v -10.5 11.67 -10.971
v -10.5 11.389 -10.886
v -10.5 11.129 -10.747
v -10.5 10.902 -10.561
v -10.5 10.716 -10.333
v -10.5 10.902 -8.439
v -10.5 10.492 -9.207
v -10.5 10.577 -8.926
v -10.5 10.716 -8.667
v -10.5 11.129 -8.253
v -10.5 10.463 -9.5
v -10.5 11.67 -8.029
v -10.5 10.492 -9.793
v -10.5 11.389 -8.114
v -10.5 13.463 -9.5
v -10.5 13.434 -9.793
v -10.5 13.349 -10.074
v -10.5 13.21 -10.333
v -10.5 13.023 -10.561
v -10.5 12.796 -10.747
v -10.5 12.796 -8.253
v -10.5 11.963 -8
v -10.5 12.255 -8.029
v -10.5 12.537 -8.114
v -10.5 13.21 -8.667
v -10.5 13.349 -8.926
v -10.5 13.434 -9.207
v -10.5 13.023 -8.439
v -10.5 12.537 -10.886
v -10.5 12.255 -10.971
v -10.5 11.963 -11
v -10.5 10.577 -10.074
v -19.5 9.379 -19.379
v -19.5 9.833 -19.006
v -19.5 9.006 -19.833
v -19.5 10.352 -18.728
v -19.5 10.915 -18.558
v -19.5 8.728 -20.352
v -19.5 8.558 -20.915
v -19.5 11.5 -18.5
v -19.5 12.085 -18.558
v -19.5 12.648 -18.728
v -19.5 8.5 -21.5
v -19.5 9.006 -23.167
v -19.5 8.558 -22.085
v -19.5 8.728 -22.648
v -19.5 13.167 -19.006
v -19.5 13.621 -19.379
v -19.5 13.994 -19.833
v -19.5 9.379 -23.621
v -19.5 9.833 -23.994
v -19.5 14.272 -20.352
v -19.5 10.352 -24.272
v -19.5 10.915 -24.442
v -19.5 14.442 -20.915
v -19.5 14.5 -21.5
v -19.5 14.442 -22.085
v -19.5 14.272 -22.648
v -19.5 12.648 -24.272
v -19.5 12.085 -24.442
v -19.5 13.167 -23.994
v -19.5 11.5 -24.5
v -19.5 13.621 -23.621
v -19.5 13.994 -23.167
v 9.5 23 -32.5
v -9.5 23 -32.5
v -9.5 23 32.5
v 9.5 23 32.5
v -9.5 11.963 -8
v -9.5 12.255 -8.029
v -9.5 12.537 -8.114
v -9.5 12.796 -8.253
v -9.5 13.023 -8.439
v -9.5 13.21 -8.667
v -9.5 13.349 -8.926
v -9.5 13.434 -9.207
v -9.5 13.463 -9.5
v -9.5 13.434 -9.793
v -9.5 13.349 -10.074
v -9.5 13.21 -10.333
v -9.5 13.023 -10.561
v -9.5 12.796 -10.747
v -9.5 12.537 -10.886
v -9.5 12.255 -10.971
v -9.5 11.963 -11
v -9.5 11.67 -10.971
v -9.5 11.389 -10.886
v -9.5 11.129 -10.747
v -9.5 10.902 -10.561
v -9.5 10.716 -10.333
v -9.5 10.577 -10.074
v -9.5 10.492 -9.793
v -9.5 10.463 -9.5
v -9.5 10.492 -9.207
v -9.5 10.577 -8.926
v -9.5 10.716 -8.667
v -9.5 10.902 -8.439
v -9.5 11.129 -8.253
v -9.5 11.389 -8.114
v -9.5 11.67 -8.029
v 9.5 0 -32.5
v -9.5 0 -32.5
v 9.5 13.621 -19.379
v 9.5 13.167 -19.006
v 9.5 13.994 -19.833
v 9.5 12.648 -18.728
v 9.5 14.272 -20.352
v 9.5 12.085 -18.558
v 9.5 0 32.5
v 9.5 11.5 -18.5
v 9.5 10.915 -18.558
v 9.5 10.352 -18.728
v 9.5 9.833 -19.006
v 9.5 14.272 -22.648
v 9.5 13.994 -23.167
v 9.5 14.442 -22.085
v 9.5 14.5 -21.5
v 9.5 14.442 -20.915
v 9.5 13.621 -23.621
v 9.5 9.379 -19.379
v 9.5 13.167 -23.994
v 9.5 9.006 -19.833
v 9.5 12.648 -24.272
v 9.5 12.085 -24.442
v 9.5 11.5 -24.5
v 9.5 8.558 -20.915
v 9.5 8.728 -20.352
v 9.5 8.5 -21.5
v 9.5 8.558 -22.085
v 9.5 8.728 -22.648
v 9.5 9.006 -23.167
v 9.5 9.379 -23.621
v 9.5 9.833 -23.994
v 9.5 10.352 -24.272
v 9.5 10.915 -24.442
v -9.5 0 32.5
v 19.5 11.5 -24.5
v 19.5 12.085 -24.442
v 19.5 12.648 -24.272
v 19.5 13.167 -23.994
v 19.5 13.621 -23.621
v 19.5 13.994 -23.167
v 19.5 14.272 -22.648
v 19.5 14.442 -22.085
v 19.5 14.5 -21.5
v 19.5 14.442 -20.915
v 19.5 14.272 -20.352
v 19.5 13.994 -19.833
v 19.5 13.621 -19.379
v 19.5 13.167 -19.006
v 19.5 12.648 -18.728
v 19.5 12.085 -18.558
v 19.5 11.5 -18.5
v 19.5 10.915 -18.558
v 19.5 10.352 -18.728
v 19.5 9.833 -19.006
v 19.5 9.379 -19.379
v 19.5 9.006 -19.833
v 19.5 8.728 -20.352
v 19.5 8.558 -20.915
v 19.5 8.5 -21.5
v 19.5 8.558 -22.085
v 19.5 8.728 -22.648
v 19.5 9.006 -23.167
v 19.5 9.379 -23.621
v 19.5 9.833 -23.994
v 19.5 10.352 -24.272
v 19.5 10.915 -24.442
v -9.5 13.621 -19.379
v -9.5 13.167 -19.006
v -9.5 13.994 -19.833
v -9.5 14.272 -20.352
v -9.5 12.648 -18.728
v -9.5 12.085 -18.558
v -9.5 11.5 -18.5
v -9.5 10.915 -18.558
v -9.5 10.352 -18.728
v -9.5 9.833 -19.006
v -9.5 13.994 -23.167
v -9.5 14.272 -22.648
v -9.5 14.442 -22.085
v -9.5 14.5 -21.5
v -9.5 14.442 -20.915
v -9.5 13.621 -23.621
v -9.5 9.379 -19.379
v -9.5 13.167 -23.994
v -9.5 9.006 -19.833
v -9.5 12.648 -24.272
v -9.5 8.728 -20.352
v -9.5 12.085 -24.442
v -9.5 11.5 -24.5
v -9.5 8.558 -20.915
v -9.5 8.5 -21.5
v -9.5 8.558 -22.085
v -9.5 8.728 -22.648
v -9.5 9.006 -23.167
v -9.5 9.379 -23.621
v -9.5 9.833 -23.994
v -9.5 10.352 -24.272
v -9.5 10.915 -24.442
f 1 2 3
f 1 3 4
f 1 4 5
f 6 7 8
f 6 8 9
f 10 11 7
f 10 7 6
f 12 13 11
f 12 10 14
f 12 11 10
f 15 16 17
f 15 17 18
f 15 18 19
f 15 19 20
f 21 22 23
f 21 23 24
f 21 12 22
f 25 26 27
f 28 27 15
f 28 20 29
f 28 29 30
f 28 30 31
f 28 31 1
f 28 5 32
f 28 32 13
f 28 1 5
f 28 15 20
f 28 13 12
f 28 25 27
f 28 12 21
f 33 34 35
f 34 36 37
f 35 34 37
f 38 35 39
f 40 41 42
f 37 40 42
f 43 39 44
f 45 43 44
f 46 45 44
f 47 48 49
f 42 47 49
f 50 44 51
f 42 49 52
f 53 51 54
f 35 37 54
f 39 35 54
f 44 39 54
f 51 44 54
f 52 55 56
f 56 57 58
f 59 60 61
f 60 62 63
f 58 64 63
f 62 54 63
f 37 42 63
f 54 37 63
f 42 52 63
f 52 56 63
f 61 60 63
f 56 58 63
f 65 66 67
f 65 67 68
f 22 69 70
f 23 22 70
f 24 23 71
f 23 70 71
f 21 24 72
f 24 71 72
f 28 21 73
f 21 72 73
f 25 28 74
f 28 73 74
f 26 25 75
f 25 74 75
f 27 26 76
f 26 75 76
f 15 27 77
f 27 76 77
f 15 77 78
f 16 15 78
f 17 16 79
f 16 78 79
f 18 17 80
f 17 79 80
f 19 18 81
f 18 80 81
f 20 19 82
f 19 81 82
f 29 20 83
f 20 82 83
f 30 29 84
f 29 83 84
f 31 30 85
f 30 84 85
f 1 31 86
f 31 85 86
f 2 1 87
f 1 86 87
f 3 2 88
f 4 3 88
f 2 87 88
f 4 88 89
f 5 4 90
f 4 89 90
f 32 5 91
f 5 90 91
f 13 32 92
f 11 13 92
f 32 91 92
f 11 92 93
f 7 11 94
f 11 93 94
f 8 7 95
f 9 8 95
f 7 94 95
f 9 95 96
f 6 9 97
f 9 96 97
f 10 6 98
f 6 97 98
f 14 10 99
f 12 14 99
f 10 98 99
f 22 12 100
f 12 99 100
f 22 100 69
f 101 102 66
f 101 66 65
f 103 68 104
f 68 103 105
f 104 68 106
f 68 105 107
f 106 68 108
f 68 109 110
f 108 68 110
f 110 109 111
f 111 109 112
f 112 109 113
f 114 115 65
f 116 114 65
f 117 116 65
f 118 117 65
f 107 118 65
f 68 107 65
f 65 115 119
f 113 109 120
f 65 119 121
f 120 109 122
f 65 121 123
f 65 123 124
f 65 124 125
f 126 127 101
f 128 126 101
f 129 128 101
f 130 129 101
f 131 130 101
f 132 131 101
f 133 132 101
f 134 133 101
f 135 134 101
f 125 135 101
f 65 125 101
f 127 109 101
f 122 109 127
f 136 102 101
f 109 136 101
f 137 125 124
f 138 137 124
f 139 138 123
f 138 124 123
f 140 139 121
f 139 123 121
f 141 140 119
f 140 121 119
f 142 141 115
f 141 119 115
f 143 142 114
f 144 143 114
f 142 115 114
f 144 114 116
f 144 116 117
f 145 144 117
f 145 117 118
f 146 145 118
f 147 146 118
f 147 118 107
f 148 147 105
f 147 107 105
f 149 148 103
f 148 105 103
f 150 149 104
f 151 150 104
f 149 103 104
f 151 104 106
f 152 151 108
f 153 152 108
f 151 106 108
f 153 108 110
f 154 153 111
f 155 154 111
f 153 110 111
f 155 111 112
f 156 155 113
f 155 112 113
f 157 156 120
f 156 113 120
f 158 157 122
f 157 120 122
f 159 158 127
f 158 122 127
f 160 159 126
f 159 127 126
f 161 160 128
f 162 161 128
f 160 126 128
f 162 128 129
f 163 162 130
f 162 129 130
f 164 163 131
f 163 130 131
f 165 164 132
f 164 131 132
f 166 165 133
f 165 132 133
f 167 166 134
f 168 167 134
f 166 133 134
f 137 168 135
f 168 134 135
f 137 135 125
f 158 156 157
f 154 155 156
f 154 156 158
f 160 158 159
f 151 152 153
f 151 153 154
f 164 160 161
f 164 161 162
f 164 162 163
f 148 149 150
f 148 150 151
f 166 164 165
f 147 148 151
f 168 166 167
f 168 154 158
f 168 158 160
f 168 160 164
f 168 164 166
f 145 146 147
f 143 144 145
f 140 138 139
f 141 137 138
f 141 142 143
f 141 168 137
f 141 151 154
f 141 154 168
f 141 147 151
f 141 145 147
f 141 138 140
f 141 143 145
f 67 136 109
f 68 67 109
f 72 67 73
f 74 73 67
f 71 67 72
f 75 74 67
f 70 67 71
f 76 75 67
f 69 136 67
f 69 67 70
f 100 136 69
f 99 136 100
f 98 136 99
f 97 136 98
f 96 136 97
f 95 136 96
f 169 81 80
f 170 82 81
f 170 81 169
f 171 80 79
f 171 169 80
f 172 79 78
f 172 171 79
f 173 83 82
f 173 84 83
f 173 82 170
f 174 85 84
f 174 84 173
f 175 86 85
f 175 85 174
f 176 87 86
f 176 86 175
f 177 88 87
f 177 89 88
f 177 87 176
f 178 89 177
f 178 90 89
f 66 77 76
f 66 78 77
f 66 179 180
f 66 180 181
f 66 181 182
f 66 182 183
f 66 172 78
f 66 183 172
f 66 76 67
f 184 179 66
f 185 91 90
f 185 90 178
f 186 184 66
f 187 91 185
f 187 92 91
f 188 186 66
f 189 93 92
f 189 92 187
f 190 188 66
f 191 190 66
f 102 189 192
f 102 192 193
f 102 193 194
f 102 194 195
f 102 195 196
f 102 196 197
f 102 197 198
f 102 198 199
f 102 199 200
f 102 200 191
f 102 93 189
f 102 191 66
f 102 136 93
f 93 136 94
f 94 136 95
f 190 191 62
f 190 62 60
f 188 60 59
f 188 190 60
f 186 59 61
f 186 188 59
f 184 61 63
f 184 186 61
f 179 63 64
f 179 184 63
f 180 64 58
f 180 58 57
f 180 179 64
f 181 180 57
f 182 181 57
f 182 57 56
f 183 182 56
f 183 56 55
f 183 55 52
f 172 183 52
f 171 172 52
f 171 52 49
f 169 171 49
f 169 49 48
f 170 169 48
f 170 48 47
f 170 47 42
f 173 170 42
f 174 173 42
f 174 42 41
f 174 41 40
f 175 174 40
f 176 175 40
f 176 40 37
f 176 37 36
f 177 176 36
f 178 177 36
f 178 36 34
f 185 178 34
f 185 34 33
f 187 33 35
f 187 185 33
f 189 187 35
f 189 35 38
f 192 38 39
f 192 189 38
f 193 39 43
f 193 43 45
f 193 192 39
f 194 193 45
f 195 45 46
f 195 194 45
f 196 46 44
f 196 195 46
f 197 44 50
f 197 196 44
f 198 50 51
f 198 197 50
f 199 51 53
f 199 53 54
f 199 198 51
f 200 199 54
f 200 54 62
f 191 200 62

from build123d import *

# Parameters (mm, degrees)
CROQUIS1_W              = 19
CROQUIS1_H              = 65
SALIENTE_EXTRUIR1_DEPTH = 23
CROQUIS2_R              = 3
SALIENTE_EXTRUIR2_DEPTH = 10
CROQUIS3_R              = 3
SALIENTE_EXTRUIR3_DEPTH = 39
CROQUIS4_R              = 1.5
SALIENTE_EXTRUIR4_DEPTH = 1


with BuildPart() as part:
    # Croquis1 → Saliente-Extruir1 (new body)
    with BuildSketch(Plane(origin=(0, 0, 0), x_dir=(1, 0, 0), z_dir=(0, 1, 0))):
        Rectangle(CROQUIS1_W, CROQUIS1_H)
    extrude(amount=SALIENTE_EXTRUIR1_DEPTH)

    # Croquis2 → Saliente-Extruir2 (add)
    with BuildSketch(Plane(origin=(9.5, 0, 0), x_dir=(0, 0, -1), z_dir=(1, 0, 0))):
        with Locations((21.5, 11.5)):
            Circle(CROQUIS2_R)
    extrude(amount=SALIENTE_EXTRUIR2_DEPTH)

    # Croquis3 → Saliente-Extruir3 (add)
    with BuildSketch(Plane(origin=(19.5, 0, 0), x_dir=(0, 0, -1), z_dir=(1, 0, 0))):
        with Locations((21.5, 11.5)):
            Circle(CROQUIS3_R)
    extrude(amount=-SALIENTE_EXTRUIR3_DEPTH)

    # Croquis4 → Saliente-Extruir4 (add)
    with BuildSketch(Plane.ZY.offset(9.5)):
        with Locations((-9.5, 11.962831391)):
            Circle(CROQUIS4_R)
    extrude(amount=SALIENTE_EXTRUIR4_DEPTH)


solid = part.part
